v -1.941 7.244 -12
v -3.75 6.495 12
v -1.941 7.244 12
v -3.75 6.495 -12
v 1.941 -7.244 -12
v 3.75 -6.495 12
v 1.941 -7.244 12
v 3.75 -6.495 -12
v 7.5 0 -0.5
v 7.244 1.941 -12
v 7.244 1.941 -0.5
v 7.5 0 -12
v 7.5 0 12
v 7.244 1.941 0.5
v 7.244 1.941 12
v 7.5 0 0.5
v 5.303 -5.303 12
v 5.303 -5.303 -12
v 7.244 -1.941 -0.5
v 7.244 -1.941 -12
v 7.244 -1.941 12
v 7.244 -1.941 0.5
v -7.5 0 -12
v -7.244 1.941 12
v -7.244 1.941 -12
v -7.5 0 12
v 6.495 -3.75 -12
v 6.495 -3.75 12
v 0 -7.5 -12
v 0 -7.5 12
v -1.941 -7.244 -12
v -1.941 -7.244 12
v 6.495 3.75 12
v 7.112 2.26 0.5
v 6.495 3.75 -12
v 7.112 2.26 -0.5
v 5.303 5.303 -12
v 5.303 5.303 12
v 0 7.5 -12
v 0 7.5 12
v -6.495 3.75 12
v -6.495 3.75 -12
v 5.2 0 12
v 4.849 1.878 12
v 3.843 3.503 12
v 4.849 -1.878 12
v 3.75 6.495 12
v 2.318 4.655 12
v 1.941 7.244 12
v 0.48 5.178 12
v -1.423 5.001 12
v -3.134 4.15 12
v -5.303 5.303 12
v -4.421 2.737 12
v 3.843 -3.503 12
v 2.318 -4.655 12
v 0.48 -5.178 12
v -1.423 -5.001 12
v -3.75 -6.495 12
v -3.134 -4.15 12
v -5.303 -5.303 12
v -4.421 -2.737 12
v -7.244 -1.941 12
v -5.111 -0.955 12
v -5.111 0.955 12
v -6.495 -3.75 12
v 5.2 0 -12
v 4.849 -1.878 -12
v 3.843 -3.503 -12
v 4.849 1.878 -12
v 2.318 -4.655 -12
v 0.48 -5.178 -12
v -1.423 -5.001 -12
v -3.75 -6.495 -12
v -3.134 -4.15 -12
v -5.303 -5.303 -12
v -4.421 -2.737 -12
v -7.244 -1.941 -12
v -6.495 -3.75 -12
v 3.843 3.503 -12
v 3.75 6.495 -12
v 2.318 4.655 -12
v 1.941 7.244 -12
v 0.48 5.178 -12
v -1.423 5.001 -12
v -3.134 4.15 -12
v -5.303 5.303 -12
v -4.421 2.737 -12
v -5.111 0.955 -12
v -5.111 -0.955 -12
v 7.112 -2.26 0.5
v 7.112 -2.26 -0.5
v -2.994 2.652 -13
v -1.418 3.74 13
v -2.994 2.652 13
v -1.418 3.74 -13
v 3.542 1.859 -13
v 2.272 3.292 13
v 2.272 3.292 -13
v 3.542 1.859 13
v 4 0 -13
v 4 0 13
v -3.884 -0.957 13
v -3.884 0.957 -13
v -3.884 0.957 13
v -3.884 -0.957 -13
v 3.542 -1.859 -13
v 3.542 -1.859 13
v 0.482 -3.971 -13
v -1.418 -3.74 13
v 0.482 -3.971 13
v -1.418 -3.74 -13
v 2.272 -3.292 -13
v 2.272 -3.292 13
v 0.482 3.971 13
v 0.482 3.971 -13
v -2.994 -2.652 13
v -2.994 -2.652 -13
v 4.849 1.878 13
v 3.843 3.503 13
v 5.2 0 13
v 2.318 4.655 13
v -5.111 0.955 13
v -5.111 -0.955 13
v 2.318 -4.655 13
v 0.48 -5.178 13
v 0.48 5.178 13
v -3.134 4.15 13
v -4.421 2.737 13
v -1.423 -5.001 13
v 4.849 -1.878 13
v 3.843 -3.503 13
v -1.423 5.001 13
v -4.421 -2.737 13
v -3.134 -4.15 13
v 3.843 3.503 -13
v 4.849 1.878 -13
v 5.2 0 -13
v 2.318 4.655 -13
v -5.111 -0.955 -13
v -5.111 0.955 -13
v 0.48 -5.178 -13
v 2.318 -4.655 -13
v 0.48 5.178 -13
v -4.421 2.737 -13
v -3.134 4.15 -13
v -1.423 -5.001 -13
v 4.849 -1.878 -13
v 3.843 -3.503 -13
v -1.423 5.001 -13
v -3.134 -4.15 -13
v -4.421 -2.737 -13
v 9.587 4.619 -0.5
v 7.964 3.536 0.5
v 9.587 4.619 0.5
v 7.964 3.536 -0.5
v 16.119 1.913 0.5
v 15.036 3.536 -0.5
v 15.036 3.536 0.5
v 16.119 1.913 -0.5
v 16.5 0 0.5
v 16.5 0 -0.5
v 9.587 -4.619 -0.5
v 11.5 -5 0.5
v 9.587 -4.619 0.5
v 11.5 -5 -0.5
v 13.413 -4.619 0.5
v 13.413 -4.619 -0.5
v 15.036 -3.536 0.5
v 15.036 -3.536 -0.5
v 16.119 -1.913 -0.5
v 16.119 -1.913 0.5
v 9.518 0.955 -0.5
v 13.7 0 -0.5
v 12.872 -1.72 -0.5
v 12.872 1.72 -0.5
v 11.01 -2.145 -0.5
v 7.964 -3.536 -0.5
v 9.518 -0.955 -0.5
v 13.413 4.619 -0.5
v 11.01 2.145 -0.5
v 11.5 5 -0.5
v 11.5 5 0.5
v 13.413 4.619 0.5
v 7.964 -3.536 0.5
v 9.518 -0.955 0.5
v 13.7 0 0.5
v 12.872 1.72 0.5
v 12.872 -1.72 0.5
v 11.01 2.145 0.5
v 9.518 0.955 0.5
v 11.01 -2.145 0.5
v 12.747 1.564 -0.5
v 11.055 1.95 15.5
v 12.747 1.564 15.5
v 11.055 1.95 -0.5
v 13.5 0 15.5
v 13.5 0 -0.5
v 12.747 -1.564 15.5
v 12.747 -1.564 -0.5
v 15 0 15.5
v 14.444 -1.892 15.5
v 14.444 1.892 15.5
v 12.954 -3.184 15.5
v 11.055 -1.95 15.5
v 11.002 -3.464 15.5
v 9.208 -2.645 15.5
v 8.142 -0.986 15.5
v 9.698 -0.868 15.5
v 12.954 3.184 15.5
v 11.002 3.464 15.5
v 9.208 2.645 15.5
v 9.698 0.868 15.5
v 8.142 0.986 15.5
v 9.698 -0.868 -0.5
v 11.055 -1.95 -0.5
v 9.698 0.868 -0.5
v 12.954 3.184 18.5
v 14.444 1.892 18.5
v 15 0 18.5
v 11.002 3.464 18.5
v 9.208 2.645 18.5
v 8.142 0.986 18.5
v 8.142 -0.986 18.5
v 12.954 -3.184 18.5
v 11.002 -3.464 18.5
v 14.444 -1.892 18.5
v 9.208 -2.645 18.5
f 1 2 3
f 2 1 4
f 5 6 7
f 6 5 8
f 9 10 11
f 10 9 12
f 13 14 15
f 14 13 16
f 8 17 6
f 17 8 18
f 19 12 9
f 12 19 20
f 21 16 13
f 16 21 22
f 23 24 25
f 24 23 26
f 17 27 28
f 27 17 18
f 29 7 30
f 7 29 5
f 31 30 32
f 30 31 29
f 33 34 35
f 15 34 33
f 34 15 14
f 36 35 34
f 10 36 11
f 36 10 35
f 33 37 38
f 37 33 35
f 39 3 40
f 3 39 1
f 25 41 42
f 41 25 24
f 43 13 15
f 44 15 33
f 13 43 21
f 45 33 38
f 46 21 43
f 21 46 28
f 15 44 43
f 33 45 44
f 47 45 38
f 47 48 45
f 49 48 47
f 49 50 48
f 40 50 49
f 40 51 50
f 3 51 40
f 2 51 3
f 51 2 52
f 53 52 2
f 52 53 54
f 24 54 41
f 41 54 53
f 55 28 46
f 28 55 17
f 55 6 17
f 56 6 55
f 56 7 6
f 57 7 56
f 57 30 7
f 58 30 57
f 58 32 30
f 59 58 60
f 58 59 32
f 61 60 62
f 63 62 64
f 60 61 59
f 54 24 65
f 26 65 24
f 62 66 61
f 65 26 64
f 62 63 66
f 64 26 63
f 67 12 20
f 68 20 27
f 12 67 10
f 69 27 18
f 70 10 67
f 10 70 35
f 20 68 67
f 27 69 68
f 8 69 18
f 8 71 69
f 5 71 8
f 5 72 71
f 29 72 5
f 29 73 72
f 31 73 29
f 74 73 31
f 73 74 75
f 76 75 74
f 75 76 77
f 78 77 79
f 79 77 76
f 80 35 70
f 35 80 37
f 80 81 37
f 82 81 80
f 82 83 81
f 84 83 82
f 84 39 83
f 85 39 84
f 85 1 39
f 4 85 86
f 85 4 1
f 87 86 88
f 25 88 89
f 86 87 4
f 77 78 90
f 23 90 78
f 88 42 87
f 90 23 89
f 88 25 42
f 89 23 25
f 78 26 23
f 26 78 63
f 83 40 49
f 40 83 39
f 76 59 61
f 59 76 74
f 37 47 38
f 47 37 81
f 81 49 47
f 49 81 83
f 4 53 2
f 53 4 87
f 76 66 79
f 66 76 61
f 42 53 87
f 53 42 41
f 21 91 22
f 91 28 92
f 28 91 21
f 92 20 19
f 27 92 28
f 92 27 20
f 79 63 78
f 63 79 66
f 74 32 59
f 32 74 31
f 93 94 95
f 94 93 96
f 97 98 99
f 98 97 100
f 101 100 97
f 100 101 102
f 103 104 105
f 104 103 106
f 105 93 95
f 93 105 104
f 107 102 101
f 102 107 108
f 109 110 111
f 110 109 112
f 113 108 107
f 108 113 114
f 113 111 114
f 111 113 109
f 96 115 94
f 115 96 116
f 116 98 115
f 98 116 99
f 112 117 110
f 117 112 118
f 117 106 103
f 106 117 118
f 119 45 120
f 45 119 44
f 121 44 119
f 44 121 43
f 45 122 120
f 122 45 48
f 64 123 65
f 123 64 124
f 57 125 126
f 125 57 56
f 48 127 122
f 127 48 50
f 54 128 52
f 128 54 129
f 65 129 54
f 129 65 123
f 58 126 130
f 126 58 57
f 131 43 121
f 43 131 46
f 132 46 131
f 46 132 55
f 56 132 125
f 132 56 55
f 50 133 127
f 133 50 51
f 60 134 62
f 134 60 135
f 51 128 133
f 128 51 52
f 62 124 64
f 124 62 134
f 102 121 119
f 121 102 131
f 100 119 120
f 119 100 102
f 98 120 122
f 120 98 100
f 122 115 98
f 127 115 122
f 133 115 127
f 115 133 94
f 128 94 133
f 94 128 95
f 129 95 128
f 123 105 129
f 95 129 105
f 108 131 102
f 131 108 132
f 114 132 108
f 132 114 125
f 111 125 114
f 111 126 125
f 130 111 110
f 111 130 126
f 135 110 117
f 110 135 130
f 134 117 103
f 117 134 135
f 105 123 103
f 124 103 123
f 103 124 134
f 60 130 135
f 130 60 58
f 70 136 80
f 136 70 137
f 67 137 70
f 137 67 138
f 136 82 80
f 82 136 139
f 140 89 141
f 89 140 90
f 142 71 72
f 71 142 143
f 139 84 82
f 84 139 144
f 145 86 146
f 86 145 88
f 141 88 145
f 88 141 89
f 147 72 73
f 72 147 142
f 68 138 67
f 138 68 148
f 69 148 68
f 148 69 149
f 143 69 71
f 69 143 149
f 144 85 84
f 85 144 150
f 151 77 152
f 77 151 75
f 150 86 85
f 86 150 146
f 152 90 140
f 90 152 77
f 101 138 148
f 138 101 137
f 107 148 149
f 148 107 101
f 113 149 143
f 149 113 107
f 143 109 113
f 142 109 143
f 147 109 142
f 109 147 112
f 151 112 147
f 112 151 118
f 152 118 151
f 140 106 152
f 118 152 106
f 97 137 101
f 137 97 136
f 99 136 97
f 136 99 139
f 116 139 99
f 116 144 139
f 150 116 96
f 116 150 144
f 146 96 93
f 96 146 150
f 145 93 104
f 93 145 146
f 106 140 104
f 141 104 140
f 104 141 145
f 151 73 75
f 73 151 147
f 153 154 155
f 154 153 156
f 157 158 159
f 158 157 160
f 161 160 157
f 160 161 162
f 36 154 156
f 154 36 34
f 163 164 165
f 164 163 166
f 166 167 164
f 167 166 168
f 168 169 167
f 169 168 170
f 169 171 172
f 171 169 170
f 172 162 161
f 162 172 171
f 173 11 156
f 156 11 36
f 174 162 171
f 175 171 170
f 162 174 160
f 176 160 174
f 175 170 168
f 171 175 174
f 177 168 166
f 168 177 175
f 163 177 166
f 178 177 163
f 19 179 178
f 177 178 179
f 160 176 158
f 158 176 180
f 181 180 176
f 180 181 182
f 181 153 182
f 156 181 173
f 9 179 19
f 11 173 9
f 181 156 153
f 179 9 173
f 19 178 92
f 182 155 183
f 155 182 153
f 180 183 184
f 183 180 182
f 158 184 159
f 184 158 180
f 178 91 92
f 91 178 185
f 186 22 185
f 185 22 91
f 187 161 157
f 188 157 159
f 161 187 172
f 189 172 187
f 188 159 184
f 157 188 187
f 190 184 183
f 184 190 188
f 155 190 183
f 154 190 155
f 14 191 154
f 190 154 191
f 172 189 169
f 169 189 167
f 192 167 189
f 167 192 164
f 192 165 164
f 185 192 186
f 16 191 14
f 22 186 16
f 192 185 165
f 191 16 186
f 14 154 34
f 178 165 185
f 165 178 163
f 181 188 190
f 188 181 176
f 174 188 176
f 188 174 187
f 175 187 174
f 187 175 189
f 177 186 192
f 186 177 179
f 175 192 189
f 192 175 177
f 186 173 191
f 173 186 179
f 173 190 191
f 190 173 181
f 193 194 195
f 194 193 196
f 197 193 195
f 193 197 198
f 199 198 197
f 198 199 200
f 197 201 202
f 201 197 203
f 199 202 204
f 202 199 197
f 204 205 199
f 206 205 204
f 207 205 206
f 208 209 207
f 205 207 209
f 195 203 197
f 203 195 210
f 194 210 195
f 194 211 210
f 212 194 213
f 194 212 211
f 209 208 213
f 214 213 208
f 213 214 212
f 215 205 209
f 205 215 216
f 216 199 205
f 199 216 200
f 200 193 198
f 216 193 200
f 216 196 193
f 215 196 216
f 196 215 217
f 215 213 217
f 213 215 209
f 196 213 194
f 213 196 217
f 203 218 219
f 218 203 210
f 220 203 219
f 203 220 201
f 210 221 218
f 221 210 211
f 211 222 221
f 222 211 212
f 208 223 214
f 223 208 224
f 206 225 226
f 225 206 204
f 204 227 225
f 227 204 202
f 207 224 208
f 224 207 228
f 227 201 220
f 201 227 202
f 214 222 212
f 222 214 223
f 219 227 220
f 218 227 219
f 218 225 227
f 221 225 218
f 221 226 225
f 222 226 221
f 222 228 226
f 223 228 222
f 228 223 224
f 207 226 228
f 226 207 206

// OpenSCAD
// Parameters
bore_diameter_mm = 8; //[4:16:0.1]
outer_diameter_mm = 15; //[8:30:0.1]
length_mm = 24; //[12:48:0.1]
centered = 1; //[0:1:1]
include_seals = 1; //[0:1:1]
include_grooves = 0; //[0:1:1]
groove_count = 0; //[0:2:1]
groove_diameter_mm = 14; //[10:29:0.1]
groove_length_mm = 1.6; //[0.8:4:0.1]
groove_spacing_mm = 18; //[8:40:0.1]
casing_wall_thickness_mm = 1.2; //[0.6:3:0.1]
seal_radial_thickness_mm = 1.2; //[0.6:3:0.1]
seal_axial_thickness_mm = 1.2; //[0.6:3:0.1]
eps_mm = 0.2; //[0.05:0.5:0.05]
overlap_mm = 1; //[0.5:2:0.1]
screw_shank_diameter_mm = 4; //[2:8:0.1]
screw_length_mm = 16; //[8:40:0.5]
screw_head_diameter_mm = 7; //[4:14:0.1]
screw_head_height_mm = 3; //[1.5:8:0.1]
washer_outer_diameter_mm = 10; //[6:20:0.1]
washer_thickness_mm = 1; //[0.5:3:0.1]

// Linear Bearing - complete geometry
module linear_bearing() {
  color([0.85, 0.85, 0.8]) {
    // Outer casing
    difference() {
      cylinder(r=outer_diameter_mm/2, h=length_mm, center=true);
      cylinder(r=bore_diameter_mm/2, h=length_mm + 2*eps_mm, center=true);
    }
    
    // End seal rings
    if (include_seals) {
      union() {
        translate([0, 0, length_mm/2 - seal_axial_thickness_mm/2 + overlap_mm])
          difference() {
            cylinder(r=bore_diameter_mm/2 + seal_radial_thickness_mm, h=seal_axial_thickness_mm, center=true);
            cylinder(r=bore_diameter_mm/2, h=seal_axial_thickness_mm + 2*eps_mm, center=true);
          }
        translate([0, 0, -length_mm/2 + seal_axial_thickness_mm/2 - overlap_mm])
          difference() {
            cylinder(r=bore_diameter_mm/2 + seal_radial_thickness_mm, h=seal_axial_thickness_mm, center=true);
            cylinder(r=bore_diameter_mm/2, h=seal_axial_thickness_mm + 2*eps_mm, center=true);
          }
      }
    }
    
    // External grooves
    if (include_grooves && groove_count > 0) {
      difference() {
        cylinder(r=outer_diameter_mm/2, h=length_mm, center=true);
        for (i = [0:groove_count-1]) {
          translate([0, 0, (i - (groove_count-1)/2) * groove_spacing_mm])
            difference() {
              cylinder(r=outer_diameter_mm/2 + eps_mm, h=groove_length_mm, center=true);
              cylinder(r=groove_diameter_mm/2, h=groove_length_mm + 2*eps_mm, center=true);
            }
        }
      }
    }
  }
}

// Screw and Washer - complete geometry
module screw_and_washer() {
  color("Silver") {
    // Washer
    translate([outer_diameter_mm/2 + washer_outer_diameter_mm/2 - overlap_mm, 0, 0])
      difference() {
        cylinder(r=washer_outer_diameter_mm/2, h=washer_thickness_mm, center=true);
        cylinder(r=screw_shank_diameter_mm/2 + eps_mm, h=washer_thickness_mm + 2*eps_mm, center=true);
      }
    
    // Screw shank
    translate([outer_diameter_mm/2 + washer_outer_diameter_mm/2 - overlap_mm, 0, washer_thickness_mm/2 + screw_length_mm/2 - overlap_mm])
      cylinder(r=screw_shank_diameter_mm/2, h=screw_length_mm, center=true);
    
    // Screw head
    translate([outer_diameter_mm/2 + washer_outer_diameter_mm/2 - overlap_mm, 0, washer_thickness_mm/2 + screw_length_mm - overlap_mm + screw_head_height_mm/2])
      cylinder(r=screw_head_diameter_mm/2, h=screw_head_height_mm, center=true);
  }
}

// Assembly
module assembly() {
  linear_bearing();
  screw_and_washer();
}

assembly();
